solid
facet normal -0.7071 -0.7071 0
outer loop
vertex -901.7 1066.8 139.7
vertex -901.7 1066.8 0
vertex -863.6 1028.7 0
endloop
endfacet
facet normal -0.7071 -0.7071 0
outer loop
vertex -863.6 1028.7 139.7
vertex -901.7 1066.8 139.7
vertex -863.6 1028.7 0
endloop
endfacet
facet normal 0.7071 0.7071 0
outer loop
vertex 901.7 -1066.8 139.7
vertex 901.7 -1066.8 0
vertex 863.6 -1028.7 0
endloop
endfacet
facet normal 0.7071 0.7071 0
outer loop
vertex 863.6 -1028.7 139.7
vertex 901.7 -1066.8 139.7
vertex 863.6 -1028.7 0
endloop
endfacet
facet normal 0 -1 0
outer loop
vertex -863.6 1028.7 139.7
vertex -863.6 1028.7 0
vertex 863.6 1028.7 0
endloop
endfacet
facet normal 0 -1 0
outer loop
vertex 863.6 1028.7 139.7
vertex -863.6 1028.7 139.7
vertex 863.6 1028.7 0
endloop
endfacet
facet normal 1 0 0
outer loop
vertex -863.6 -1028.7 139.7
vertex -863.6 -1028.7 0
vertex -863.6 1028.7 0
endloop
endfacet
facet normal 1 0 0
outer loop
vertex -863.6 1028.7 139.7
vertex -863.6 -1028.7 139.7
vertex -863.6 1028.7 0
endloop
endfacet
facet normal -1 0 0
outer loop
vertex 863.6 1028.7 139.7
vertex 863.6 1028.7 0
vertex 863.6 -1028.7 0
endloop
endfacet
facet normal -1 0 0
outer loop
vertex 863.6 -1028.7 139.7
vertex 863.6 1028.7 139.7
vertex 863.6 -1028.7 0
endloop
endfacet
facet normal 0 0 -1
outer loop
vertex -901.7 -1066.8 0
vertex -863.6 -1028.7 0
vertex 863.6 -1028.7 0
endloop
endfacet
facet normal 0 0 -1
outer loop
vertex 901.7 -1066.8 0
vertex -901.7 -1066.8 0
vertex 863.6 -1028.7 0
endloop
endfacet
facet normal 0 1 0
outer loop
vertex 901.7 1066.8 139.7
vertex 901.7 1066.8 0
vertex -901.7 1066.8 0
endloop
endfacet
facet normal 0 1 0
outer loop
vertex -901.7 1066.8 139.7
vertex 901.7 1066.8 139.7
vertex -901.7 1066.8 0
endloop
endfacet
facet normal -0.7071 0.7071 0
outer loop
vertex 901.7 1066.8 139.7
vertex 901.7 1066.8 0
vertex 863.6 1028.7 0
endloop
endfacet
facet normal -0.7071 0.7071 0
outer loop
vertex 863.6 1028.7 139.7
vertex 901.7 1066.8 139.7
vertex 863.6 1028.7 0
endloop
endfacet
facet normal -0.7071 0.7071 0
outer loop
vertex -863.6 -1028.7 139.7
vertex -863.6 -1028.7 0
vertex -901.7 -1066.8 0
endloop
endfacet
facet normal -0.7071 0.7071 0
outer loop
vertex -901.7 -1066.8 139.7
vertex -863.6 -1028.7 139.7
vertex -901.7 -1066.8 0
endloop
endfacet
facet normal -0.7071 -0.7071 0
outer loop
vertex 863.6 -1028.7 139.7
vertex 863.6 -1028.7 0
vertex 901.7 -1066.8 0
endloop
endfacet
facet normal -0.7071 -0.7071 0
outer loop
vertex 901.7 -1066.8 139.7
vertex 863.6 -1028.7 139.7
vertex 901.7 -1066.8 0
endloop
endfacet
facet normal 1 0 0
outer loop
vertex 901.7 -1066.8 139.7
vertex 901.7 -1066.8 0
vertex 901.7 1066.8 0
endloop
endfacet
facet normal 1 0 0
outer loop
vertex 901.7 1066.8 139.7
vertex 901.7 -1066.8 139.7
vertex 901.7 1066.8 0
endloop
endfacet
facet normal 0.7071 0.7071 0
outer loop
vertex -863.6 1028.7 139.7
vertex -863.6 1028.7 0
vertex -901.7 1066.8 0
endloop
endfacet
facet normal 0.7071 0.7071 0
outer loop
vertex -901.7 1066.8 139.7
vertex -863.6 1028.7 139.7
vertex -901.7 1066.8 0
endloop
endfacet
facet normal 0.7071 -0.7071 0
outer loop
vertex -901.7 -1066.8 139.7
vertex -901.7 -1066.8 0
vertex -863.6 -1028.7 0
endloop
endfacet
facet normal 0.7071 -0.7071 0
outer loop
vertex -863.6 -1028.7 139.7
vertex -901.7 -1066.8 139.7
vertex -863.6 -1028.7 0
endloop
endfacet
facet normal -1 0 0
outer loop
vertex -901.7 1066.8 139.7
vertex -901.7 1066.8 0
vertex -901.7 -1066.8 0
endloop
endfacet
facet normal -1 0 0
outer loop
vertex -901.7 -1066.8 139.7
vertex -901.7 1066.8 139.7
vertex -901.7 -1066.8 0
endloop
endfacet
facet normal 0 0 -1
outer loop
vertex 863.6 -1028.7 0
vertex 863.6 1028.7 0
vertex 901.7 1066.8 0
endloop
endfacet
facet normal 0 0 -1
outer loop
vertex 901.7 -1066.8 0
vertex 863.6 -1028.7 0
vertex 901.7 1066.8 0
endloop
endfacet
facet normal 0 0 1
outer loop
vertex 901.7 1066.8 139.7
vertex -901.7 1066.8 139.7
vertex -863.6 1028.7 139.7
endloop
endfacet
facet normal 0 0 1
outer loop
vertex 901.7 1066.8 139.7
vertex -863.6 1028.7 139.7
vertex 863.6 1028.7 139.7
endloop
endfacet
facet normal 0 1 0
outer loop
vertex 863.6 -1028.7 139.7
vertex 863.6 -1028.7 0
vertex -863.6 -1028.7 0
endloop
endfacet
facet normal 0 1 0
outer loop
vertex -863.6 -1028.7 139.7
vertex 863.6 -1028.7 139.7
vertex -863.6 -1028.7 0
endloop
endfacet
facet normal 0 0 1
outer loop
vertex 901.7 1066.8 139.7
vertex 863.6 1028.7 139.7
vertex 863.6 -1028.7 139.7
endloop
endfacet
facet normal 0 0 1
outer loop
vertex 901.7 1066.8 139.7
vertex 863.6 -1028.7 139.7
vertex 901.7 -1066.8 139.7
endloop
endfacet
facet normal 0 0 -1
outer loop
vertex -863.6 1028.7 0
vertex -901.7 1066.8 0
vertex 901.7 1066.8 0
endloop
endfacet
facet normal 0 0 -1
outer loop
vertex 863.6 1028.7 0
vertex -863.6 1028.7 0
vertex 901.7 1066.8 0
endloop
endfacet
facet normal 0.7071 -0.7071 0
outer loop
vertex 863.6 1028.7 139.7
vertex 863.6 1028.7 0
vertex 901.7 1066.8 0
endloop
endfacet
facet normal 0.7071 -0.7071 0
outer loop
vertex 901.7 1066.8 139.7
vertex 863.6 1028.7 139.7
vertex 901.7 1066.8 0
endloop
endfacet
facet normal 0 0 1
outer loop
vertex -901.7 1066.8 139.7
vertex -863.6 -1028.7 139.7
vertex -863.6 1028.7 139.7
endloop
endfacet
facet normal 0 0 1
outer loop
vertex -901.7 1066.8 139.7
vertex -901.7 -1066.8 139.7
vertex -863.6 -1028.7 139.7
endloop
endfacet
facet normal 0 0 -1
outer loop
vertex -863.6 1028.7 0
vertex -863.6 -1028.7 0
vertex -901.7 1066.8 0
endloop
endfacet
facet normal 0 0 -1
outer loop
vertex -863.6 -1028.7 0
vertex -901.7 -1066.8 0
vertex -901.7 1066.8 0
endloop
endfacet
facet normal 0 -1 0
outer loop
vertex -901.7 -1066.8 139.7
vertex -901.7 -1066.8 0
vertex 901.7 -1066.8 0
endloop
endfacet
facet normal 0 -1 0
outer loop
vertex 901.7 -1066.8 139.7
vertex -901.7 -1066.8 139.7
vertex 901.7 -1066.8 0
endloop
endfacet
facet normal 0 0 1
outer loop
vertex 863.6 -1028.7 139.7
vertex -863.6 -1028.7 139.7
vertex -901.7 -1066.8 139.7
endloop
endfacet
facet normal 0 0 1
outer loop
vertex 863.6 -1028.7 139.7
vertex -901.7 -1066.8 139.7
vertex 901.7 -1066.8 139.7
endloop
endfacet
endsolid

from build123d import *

# Parameters (mm, degrees)
F1_DEPTH = 139.7
F2_DEPTH = 139.7


with BuildPart() as f1:
    # F0 (on Top) → F1 (new body)
    with BuildSketch(Plane.XY):
        Polygon((-863.6, 1028.7), (863.6, 1028.7), (901.7, 1066.8), (-901.7, 1066.8), align=None)
        Polygon((901.7, -1066.8), (863.6, -1028.7), (-863.6, -1028.7), (-901.7, -1066.8), align=None)
    extrude(amount=F1_DEPTH)


with BuildPart() as f2:
    # F0 (on Top) → F2 (new body)
    with BuildSketch(Plane.XY):
        Polygon((901.7, 1066.8), (863.6, 1028.7), (863.6, -1028.7), (901.7, -1066.8), align=None)
        Polygon((-863.6, -1028.7), (-863.6, 1028.7), (-901.7, 1066.8), (-901.7, -1066.8), align=None)
    extrude(amount=F2_DEPTH)


solid = Compound([f1.part, f2.part])
